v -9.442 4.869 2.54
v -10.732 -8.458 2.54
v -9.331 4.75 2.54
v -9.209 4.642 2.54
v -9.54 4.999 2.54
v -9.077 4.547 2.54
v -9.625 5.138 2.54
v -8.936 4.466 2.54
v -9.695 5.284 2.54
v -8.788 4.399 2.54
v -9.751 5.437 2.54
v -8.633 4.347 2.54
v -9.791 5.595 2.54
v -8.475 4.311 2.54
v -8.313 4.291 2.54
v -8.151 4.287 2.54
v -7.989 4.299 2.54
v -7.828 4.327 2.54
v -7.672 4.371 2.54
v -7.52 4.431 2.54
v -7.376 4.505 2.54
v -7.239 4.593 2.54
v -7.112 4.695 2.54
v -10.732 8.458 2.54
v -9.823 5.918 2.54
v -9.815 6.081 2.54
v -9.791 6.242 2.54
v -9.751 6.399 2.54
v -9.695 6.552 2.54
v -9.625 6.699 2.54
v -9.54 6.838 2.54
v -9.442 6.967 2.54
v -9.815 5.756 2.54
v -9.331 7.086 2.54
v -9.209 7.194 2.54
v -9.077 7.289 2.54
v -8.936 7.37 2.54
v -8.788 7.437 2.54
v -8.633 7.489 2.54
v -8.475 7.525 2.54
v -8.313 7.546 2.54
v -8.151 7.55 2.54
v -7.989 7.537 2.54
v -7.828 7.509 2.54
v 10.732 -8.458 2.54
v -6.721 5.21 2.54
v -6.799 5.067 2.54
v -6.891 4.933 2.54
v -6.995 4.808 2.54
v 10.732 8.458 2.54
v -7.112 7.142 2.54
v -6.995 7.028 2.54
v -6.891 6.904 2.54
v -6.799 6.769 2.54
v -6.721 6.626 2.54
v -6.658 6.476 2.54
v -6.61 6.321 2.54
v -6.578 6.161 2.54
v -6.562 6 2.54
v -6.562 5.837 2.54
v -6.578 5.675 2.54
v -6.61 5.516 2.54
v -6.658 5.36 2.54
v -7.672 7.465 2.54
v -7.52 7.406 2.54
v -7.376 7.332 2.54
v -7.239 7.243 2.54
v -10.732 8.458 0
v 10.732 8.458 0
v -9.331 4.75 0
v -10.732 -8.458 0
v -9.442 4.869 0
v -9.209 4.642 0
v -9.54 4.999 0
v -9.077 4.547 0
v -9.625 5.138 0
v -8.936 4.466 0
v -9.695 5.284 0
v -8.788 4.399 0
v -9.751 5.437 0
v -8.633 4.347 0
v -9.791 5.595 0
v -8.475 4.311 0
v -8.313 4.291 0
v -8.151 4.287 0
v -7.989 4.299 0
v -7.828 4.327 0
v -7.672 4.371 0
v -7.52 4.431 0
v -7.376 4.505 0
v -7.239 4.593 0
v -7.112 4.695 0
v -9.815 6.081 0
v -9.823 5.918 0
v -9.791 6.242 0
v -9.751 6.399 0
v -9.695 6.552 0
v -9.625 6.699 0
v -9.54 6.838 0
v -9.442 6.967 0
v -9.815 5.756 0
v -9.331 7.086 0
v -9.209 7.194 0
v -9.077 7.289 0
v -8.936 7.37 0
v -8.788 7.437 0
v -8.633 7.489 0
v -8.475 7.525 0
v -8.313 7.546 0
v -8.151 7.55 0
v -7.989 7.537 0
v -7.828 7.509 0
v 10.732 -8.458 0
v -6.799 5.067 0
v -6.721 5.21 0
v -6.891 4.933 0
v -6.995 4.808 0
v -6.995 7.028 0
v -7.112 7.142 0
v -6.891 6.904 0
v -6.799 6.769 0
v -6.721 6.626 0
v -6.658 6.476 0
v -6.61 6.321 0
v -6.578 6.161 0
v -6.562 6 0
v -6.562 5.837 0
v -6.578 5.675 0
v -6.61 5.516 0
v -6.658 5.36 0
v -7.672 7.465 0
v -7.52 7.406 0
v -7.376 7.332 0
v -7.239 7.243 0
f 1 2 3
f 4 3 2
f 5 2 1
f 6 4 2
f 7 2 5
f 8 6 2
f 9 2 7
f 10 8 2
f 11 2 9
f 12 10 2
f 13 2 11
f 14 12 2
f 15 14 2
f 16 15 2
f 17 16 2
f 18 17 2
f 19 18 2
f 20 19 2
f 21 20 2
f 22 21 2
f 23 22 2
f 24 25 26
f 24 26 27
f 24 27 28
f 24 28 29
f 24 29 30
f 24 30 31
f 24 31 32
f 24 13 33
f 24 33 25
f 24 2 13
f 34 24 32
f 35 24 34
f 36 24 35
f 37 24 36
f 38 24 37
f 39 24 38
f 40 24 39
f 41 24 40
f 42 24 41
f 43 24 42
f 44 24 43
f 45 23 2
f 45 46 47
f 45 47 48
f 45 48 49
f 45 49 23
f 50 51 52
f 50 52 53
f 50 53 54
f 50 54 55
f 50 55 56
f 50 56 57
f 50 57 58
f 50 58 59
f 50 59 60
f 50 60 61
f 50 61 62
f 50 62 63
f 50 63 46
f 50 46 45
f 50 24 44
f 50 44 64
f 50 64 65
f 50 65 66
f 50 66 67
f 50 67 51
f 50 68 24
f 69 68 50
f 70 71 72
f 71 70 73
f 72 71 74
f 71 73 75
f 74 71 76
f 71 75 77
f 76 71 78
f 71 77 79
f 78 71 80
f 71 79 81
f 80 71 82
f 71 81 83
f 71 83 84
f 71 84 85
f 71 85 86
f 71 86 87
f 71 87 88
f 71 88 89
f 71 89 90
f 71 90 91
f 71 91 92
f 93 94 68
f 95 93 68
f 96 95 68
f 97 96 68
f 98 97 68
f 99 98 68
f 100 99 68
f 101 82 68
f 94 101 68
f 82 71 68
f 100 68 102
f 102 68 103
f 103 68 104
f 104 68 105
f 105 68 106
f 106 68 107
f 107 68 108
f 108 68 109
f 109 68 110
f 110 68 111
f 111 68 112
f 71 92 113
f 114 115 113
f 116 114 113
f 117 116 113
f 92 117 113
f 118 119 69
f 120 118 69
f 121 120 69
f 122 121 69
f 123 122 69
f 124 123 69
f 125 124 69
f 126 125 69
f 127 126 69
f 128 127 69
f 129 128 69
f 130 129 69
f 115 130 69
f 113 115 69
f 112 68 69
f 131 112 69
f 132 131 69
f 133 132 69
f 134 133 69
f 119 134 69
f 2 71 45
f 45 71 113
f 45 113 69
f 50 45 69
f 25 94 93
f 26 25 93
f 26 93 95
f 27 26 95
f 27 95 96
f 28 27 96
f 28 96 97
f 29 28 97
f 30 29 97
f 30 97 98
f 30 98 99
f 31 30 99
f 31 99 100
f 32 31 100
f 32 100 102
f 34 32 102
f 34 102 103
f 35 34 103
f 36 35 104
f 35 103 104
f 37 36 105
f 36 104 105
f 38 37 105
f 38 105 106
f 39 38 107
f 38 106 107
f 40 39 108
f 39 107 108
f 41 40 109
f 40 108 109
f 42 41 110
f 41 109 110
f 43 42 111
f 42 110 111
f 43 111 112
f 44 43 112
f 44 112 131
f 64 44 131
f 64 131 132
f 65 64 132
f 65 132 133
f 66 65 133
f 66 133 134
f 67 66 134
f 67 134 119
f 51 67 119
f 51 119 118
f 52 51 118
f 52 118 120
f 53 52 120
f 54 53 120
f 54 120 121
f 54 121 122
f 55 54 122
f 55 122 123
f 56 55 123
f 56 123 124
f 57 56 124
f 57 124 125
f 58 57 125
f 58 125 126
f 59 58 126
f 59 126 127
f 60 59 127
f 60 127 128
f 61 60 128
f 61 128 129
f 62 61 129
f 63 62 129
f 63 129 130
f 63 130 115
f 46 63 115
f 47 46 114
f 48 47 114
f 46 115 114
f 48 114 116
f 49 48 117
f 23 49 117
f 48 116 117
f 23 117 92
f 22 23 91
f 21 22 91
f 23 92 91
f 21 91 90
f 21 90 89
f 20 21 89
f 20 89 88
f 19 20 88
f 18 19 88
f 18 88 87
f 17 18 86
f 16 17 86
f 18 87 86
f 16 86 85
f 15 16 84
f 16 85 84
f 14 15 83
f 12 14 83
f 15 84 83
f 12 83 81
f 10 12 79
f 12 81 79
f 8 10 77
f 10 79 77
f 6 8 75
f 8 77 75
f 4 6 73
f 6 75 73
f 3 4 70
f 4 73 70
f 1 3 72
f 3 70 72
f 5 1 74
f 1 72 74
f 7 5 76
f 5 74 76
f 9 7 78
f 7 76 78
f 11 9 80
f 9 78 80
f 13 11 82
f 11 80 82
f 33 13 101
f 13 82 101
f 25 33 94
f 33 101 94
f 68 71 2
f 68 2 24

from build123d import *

# Parameters (mm, degrees)
SKETCH1_W             = 21.463
SKETCH1_H             = 16.9164
BOSS_EXTRUDE1_DEPTH   = 2.54
F_4_CLEARANCE_HOLE1_D = 3.2639


with BuildPart() as part:
    # Sketch1 → Boss-Extrude1 (new body)
    with BuildSketch(Plane.XY):
        Rectangle(SKETCH1_W, SKETCH1_H)
    extrude(amount=BOSS_EXTRUDE1_DEPTH)

    # #4 Clearance Hole1 (through all)
    with Locations(Plane.XY.offset(2.54)):
        with Locations((-8.1915, 5.9182)):
            Hole(F_4_CLEARANCE_HOLE1_D / 2)


solid = part.part
